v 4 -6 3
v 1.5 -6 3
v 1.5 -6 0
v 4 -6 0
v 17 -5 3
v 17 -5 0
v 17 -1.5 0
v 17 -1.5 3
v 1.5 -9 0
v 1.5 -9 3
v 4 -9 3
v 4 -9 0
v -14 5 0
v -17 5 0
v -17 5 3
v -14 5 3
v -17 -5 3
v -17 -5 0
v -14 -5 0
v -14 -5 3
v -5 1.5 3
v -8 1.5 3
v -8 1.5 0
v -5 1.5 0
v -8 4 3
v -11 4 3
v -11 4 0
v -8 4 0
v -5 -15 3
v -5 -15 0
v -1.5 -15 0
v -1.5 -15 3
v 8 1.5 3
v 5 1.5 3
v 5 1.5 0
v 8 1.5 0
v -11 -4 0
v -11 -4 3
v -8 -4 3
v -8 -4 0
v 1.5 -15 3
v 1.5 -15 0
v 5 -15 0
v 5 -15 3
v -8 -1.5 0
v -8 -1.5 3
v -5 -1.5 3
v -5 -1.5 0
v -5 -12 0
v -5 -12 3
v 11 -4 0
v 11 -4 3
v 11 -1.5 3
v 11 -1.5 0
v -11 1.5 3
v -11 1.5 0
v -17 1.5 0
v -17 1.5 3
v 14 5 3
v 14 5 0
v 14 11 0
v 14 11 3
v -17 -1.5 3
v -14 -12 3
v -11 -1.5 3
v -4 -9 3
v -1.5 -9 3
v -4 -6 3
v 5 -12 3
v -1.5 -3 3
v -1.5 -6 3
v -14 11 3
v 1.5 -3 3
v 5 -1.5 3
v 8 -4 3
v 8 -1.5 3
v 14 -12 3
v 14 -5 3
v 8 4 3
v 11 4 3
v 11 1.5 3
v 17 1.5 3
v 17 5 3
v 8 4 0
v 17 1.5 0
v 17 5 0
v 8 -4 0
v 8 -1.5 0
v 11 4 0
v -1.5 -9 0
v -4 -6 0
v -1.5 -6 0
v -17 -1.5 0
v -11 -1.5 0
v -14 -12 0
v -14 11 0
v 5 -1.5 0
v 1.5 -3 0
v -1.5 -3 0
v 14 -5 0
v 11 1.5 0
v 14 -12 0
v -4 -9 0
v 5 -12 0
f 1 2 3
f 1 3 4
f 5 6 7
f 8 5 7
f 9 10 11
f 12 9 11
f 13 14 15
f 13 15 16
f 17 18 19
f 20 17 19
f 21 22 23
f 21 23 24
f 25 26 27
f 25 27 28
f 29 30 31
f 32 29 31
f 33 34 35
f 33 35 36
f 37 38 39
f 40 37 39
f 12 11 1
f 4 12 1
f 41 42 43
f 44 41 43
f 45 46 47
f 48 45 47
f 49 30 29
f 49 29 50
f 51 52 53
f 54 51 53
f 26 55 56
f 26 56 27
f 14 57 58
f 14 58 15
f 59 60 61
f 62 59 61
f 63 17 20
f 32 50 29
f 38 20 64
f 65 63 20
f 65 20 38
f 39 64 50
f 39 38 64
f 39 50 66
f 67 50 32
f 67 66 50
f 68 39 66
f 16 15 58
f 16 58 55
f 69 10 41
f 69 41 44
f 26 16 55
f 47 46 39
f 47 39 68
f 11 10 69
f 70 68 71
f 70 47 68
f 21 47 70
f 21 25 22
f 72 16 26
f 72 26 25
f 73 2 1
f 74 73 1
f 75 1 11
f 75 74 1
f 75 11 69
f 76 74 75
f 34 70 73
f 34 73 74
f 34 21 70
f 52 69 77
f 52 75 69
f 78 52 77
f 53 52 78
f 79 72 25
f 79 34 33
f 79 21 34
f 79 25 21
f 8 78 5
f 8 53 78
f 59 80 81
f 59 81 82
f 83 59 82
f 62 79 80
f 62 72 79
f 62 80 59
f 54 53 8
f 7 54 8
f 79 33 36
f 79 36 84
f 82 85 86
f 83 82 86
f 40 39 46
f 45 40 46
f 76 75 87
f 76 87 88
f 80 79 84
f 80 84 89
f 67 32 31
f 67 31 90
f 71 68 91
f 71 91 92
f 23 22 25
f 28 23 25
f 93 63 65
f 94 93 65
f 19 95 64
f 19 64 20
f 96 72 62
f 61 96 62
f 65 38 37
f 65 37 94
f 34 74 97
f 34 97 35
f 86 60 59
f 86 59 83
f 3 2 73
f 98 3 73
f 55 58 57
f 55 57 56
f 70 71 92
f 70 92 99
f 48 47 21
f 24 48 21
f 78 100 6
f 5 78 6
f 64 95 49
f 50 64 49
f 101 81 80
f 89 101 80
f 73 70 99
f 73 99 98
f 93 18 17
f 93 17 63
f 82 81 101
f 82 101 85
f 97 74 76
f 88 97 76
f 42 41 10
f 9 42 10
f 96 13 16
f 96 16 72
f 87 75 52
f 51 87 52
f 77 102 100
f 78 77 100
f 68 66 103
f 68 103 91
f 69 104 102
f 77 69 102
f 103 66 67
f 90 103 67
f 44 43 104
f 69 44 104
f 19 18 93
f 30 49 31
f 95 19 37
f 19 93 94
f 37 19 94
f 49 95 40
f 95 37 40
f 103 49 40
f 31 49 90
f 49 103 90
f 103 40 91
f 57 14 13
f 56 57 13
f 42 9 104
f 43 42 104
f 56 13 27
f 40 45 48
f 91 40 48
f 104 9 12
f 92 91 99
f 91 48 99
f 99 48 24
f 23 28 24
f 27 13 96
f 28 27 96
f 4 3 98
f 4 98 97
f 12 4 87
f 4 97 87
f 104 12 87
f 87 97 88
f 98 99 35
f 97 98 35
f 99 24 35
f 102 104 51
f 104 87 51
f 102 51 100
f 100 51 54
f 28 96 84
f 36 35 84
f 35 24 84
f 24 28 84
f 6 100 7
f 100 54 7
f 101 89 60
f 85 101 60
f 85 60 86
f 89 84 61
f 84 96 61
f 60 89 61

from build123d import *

# Parameters (mm, degrees)
SKETCH_1_W          = 28
SKETCH_1_H          = 24
SKETCH_1_W_2        = 3
SKETCH_1_H_2        = 10
SKETCH_1_W_3        = 10
SKETCH_1_H_3        = 3
EXTRUDE_1_DEPTH     = 3
SKETCH_2_W          = 6
SKETCH_2_H          = 3
SKETCH_2_W_2        = 3
SKETCH_2_H_2        = 2.5
SKETCH_2_W_3        = 2.5
SKETCH_2_H_3        = 6
CUT_EXTRUDE_1_DEPTH = 3
SKETCH_3_W          = 28
SKETCH_3_H          = 1
CUT_EXTRUDE_2_DEPTH = 3


with BuildPart() as part:
    # 草图1 → 凸台-拉伸1 (new body)
    with BuildSketch(Plane.XY):
        Rectangle(SKETCH_1_W, SKETCH_1_H)
        with Locations((-15.5, 0)):
            Rectangle(SKETCH_1_W_2, SKETCH_1_H_2)
        with Locations((15.5, 0)):
            Rectangle(SKETCH_1_W_2, SKETCH_1_H_2)
        with Locations((0, -13.5)):
            Rectangle(SKETCH_1_W_3, SKETCH_1_H_3)
    extrude(amount=EXTRUDE_1_DEPTH)

    # 草图2 → 切除-拉伸1 (cut)
    with BuildSketch(Plane.XY.offset(3)):
        with Locations((-14, 0)):
            Rectangle(SKETCH_2_W, SKETCH_2_H)
        with Locations((-9.5, 2.75)):
            Rectangle(SKETCH_2_W_2, SKETCH_2_H_2)
        with Locations((-9.5, 0)):
            Rectangle(SKETCH_2_W_2, SKETCH_2_H)
        with Locations((-9.5, -2.75)):
            Rectangle(SKETCH_2_W_2, SKETCH_2_H_2)
        with Locations((-6.5, 0)):
            Rectangle(SKETCH_2_W_2, SKETCH_2_H)
        with Locations((6.5, 0)):
            Rectangle(SKETCH_2_W_2, SKETCH_2_H)
        with Locations((9.5, 2.75)):
            Rectangle(SKETCH_2_W_2, SKETCH_2_H_2)
        with Locations((9.5, 0)):
            Rectangle(SKETCH_2_W_2, SKETCH_2_H)
        with Locations((9.5, -2.75)):
            Rectangle(SKETCH_2_W_2, SKETCH_2_H_2)
        with Locations((14, 0)):
            Rectangle(SKETCH_2_W, SKETCH_2_H)
        with Locations((-2.75, -7.5)):
            Rectangle(SKETCH_2_W_3, SKETCH_2_H)
        with Locations((0, -4.5)):
            Rectangle(SKETCH_2_W_2, SKETCH_2_H)
        with Locations((0, -7.5)):
            Rectangle(SKETCH_2_W_2, SKETCH_2_H)
        with Locations((2.75, -7.5)):
            Rectangle(SKETCH_2_W_3, SKETCH_2_H)
        with Locations((0, -12)):
            Rectangle(SKETCH_2_W_2, SKETCH_2_H_3)
    extrude(amount=-CUT_EXTRUDE_1_DEPTH, mode=Mode.SUBTRACT)

    # 草图3 → 切除-拉伸2 (cut)
    with BuildSketch(Plane.XY.offset(3)):
        with Locations((0, 11.5)):
            Rectangle(SKETCH_3_W, SKETCH_3_H)
    extrude(amount=-CUT_EXTRUDE_2_DEPTH, mode=Mode.SUBTRACT)


solid = part.part
